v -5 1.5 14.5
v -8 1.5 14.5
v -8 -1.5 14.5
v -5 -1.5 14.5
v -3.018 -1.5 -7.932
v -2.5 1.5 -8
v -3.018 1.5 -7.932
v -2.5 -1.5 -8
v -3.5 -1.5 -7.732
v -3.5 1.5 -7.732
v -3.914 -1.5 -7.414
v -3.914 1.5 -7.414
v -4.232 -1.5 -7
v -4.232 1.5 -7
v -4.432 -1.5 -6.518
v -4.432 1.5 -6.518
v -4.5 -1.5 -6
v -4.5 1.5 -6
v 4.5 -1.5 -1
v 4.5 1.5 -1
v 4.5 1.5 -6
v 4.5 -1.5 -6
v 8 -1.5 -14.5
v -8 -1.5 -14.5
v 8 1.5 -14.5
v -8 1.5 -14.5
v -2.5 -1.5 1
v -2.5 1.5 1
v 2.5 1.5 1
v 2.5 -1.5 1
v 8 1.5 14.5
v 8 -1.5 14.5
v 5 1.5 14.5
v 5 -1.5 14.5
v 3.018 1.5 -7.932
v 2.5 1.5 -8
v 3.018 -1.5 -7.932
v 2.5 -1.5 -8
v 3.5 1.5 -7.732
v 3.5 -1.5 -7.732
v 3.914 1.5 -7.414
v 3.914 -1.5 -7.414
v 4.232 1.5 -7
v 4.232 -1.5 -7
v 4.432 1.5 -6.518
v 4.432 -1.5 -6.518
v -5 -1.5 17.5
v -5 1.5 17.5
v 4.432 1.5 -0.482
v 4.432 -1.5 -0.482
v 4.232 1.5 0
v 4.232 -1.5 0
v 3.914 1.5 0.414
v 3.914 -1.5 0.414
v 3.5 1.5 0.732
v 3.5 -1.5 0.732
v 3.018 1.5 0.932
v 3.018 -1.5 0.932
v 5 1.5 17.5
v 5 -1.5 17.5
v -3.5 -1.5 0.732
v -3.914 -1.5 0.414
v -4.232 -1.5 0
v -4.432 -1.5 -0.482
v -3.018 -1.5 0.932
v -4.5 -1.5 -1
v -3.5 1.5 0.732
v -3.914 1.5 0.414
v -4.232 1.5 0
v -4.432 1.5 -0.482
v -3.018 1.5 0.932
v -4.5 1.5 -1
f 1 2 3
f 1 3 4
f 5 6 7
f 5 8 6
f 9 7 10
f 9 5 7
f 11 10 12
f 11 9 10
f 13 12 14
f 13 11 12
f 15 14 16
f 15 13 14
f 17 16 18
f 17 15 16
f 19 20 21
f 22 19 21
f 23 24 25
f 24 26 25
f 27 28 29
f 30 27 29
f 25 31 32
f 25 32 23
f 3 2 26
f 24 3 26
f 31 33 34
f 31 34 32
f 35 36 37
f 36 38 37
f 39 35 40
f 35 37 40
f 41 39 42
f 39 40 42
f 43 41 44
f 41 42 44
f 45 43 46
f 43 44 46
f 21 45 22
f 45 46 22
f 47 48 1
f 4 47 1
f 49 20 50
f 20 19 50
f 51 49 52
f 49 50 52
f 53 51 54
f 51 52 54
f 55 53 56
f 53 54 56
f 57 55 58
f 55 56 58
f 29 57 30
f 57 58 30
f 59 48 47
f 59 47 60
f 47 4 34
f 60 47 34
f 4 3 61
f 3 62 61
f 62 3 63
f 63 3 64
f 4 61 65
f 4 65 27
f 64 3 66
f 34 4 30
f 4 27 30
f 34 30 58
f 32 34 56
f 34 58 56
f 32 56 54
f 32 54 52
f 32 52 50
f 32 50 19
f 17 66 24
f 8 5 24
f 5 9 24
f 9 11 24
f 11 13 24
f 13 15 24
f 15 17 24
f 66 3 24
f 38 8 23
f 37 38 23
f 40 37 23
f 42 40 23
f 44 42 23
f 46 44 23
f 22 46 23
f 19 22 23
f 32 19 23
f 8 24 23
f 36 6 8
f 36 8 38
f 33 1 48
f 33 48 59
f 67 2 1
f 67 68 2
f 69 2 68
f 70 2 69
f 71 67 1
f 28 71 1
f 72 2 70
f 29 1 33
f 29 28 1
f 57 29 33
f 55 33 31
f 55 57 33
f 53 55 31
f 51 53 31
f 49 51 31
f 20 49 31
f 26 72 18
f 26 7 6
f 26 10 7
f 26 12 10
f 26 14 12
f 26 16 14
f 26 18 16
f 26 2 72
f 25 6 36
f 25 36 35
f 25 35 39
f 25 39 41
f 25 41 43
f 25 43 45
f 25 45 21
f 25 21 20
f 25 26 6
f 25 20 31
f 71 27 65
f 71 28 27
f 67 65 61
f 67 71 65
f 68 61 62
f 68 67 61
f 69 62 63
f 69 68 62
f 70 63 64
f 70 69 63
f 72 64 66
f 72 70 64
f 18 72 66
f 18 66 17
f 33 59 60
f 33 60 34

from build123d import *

# Parameters (mm, degrees)
SKETCH1_W               = 16
SKETCH1_H               = 29
BOSS_EXTRUDE1_DEPTH     = 1.5
SKETCH2_W               = 10
SKETCH2_H               = 3
BOSS_EXTRUDE2_DEPTH     = 1.5
SKETCH3_W               = 9
SKETCH3_H               = 9
CUT_EXTRUDE1_DEPTH      = 2.5
CUT_EXTRUDE1_DEPTH_BACK = 2.5
FILLET1_R               = 2


with BuildPart() as part:
    # Sketch1 → Boss-Extrude1 (new body, symmetric)
    with BuildSketch(Plane(origin=(0, 0, 0), x_dir=(1, 0, 0), z_dir=(0, 1, 0))):
        Rectangle(SKETCH1_W, SKETCH1_H)
    extrude(amount=BOSS_EXTRUDE1_DEPTH, both=True)

    # Sketch2 → Boss-Extrude2 (add, symmetric)
    with BuildSketch(Plane(origin=(0, 0, 0), x_dir=(1, 0, 0), z_dir=(0, 1, 0))):
        with Locations((0, -16)):
            Rectangle(SKETCH2_W, SKETCH2_H)
    extrude(amount=BOSS_EXTRUDE2_DEPTH, both=True)

    # Sketch3 → Cut-Extrude1 (cut, two sides)
    with BuildSketch(Plane(origin=(0, 0, 0), x_dir=(1, 0, 0), z_dir=(0, 1, 0))) as cut_extrude1_sk:
        with Locations((0, 3.5)):
            Rectangle(SKETCH3_W, SKETCH3_H)
    extrude(amount=CUT_EXTRUDE1_DEPTH, mode=Mode.SUBTRACT)
    extrude(cut_extrude1_sk.sketch, amount=-CUT_EXTRUDE1_DEPTH_BACK, mode=Mode.SUBTRACT)

    # Fillet1
    fillet1_edges = [part.edges().sort_by_distance(p)[0] for p in [
        (-4.5, 0, 1),
        (-4.5, 0, -8),
        (4.5, 0, -8),
        (4.5, 0, 1),
    ]]
    fillet(fillet1_edges, radius=FILLET1_R)


solid = part.part
